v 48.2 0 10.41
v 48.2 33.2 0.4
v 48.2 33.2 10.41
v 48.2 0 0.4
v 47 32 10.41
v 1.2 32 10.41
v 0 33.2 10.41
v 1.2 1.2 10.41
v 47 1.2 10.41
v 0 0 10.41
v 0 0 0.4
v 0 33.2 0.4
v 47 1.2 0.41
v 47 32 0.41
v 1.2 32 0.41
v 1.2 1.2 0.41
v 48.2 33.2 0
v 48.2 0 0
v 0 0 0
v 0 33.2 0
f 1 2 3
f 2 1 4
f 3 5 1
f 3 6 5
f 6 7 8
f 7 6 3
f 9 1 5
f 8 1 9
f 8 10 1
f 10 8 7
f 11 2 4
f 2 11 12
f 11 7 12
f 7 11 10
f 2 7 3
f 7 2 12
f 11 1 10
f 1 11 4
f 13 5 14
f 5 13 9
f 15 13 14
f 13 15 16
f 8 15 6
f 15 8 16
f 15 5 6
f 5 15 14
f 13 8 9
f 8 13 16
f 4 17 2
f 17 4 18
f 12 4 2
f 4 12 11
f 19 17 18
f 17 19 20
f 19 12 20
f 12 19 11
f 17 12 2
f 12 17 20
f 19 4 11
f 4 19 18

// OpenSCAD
// file: ../../Base/Rotation.scad
// Fischertechnik Box Foundation
// Geometry Helpers Rotation

include <PlacementOptions.scad>

// getRotatedSpace(space, rotation=NoRotation)
// Rotates the space dependent on the specified rotation

function getRotatedSpace(space, rotation=NoRotation) = [
    (rotation == Rotate90 || rotation == Rotate270) ? space.y : space.x,
    (rotation == Rotate90 || rotation == Rotate270) ? space.x : space.y
];

// Rotates the given space around the fixed left lower corner
// space = the space the children needs as width/depth list [width,depth]
// rotation = 0 Rotate0 degrees, 1 Rotate90 degrees, 2 Rotate180 degrees, 3 Rotate270 degrees (equivalent to -90)

module RotateFix(space, rotation=NoRotation) {
    dy = (rotation == Rotate0 || rotation == Rotate270) ? 0 :
        (rotation == Rotate90) ? space.x :
        space.y;
    dx = (rotation < Rotate180) ? 0 :
        (rotation == Rotate180) ? space.x :
        space.y;
    
    translate([dx, dy, 0])
        rotate([0, 0, rotations[rotation]])
            children();
}
// file: ../../Base/Alignment.scad
// Fischertechnik Box Foundation
// Geometry Helpers Alignment

include <PlacementOptions.scad>

// getAlignedX(elementWidth, spaceWidth, align=AlignRight, offset=0)
// Gets the aligned X offset of an element with the given
// width in the given space.
// elementWidth = The width of the element to positon
// spaceWidth = The space where the element should be aligned
// align = 0 AlignLeft, 1 AlignCenter, 2 AlignRight
// offset = an optional offset from the aligned position. When
// aligned left or centered, then positive values are in X direction.
// When aligned right then positive values are in negative X direction.

function getAlignedX(elementWidth, spaceWidth, align=AlignRight, offset=0) =
    (align == AlignLeft) ?
        offset :
        ((align == AlignCenter) ?
        (spaceWidth - elementWidth)/2 + offset :
        spaceWidth - offset - elementWidth);

// getAlignedY(elementDepth, spaceDepth, align=AlignTop, offset=0)
// Gets the aligned Y offset of an element with the given
// depth in the given space.
// elementDepth = The depth of the element to positon
// spaceDepth = The space where the element should be aligned
// align = 0 AlignBottom, 1 AlignCenter, 2 AlignTop
// offset = an optional offset from the aligned position. When
// aligned bottom or centered, then positive values are in Y direction.
// When aligned top then positive values are in negative Y direction.

function getAlignedY(elementDepth, spaceDepth, align=AlignTop, offset=0) =
    (align == AlignBottom) ?
        offset :
        ((align == AlignCenter) ?
        (spaceDepth - elementDepth)/2 + offset :
        spaceDepth - offset - elementDepth);
// file: ../../Base/PlacementOptions.scad
// Fischertechnik Box Foundation
// Placement Options

// Alignment
NoAlign = 0;
AlignLeft = 1;
AlignBottom = 2;
AlignCenter = 3;
AlignRight = 4;
AlignTop = 5;

// Element rotation degree steps
rotations = [0, -90, -180, -270];

// Rotation
NoRotation = 0;
Rotate0 = 0;
Rotate90 = 1;
Rotate180 = 2;
Rotate270 = 3;

// Docking (seen from above)
NoDock = -1;
DockLeft = 0;
DockTop = 1;
DockRight = 2;
DockCorner = 2;
DockBottom = 3;

// Web corners
LowerLeft = 0;
UpperLeft = 1;
UpperRight = 2;
LowerRight = 3;

// Web position relative to corner
LeftOfCorner = 0;
RightOfCorner = 1;
// file: ../../Base/Boxes.scad
// Fischertechnik Box Foundation
// Pre-designed Boxes

use <Constants.scad>

include <PlacementOptions.scad>

box190Width = 190;
box190Depth = 130;
box130Width = 130;
box130Depth = 95;

// Values are from an original ec3 box
topBottomDifference = 1.5;
outerHeight = 40;
innerHeight = 38.2;
baseThickness = outerHeight - innerHeight;
stackExcess = 5.7;
radius = 3.5;
wallThickness = 1.5;
tolerance = 0.2;
stackOffset = innerHeight - stackExcess;

boxUsageHeight = stackOffset;
boxWallThickness = wallThickness;
boxBaseThickness = baseThickness;
boxWebWidth = 3.0;

// getBoxWallThickness()
// Gets the wall thickness of a Fischertechnik Box
function getBoxWallThickness() = boxWallThickness;

// getBoxUsageHeight()
// Gets the usable height of a Fischertechnik box
function getBoxUsageHeight() = boxUsageHeight;

// getBoxInnerHeight()
// Gets the inner height of a Fischertechnik box, including the stack excess
function getBoxInnerHeight() = innerHeight;

// getBoxBaseThickness()
// Gets the thickness of the Fischertechnik box base.
function getBoxBaseThickness() = boxBaseThickness;

// getBoxWebWidth()
// Gets the width of a box web
function getBoxWebWidth() = boxWebWidth;

// getBox190Space()
// Gets the usable inner space of a Box 190 as an x/y-list
function getBox190Space() = [
    box190Width - 2*getBoxWallThickness() - topBottomDifference, 
    box190Depth - 2*getBoxWallThickness() - topBottomDifference ];

// BoxBase(width, depth)
// Creates an empty stackable Fischertechnik compatible box
// width = Outer width of the box (190, 130, ...)
// depth = Outer depth of the box (130, 95, ...)

module BoxBase(width, depth, height=outerHeight) {    
    thinPlate = 0.01;

    innerHeight = height - baseThickness;    
    
    module BodyPlate(width, depth) {
        translate([radius, radius])
        hull() {
            w = width-2*radius;
            d = depth-2*radius;
            cube([w, d, thinPlate]);
            cylinder(thinPlate, r=radius, $fn=getFragments());
            translate([w, 0])
                cylinder(thinPlate, r=radius, $fn=getFragments());
            translate([w, d])
                cylinder(thinPlate, r=radius, $fn=getFragments());
            translate([0, d])
                cylinder(thinPlate, r=radius, $fn=getFragments());
        }
    }
    
    module Body(tolerance=tolerance) {
        hull() {
            // Bottom with tolerance to fit into the original boxes when stacked
            translate([-wallThickness+tolerance, -wallThickness+tolerance, -baseThickness])
                BodyPlate(width-topBottomDifference-2*tolerance, depth-topBottomDifference-2*tolerance);
            
            // Top
            translate([-wallThickness-topBottomDifference/2, -wallThickness-topBottomDifference/2, innerHeight-thinPlate])
                BodyPlate(width, depth);
         }
    }

    module Cutoff() {
        hull() {
            coWidth = width - 2*wallThickness;
            coDepth = depth - 2*wallThickness;
            
            // Bottom
            BodyPlate(coWidth-topBottomDifference, coDepth-topBottomDifference);

            // Top
            translate([-topBottomDifference/2, -topBottomDifference/2, innerHeight+thinPlate]) 
                BodyPlate(coWidth, coDepth);
        }
    }
    
    difference() {        
        Body();
        Cutoff();
        stackOffset = innerHeight - stackExcess;
        translate([0, 0, stackOffset + baseThickness])
            Body(tolerance=0);
    }
}

// Creates the Fischertechnik empty box 130x190 mm and places it at position 0,0
// 190x130 are the outer sizes, the inner space is slightly smaller. Use getBox190Space() to get the inner sizes.
// The box is positioned that the usable inner space is at the 0,0,0 position. The

module Box190() {
    BoxBase(box190Width, box190Depth);
}

// Gets the usable inner space of a Box 130 as an x/y-list
function getBox130Space() = [
    box130Width - 2*getBoxWallThickness() - topBottomDifference, 
    box130Depth - 2*getBoxWallThickness() - topBottomDifference ];

// Creates the Fischertechnik empty box 95x130 mm and places it at position 0,0
// 190x130 are the outer sizes, the inner space is slightly smaller. Use getBox190Space() to get the inner sizes.
// The box is positioned that the usable inner space is at the 0,0,0 position. The

module Box130() {
    BoxBase(box130Width, box130Depth);
}

// Creates a web at the specified box walls
// corner 0 = LowerLeft, 1 = UpperLeft, 2 = UpperRight, 3 = LowerRight
// side 0 = LeftOfCorner, 1 = RightOfCorner
// distance = Distance in mm from the corner
// boxSpace = inner width and depth of the box (default: Box 190)
// webWidth = length of the web (default is 3 mms)
// webThickness = thickness of the web (default is 1 mm)

module BoxWeb(corner, side, distance, boxSpace=getBox190Space(), webWidth=getBoxWebWidth(), webThickness=1.0) {
    sink = getBoxWallThickness()/2;

    width = (corner % 2 == 0) ? 
            (side == LeftOfCorner ? webWidth : webThickness) :
            (side == LeftOfCorner ? webThickness : webWidth);

    depth = (corner % 2 == 0) ? 
            (side == RightOfCorner ? webWidth : webThickness) :
            (side == RightOfCorner ? webThickness : webWidth);
    
    xDiff = corner == LowerLeft ? 
                (side == LeftOfCorner ? -sink : distance) :
            (corner == UpperLeft ?                
                (side == LeftOfCorner ? distance : -sink) :
            (corner == UpperRight ?
                (side == LeftOfCorner ? boxSpace.x-webWidth+sink : boxSpace.x-distance-webThickness) :
                (side == LeftOfCorner ? boxSpace.x-distance-webThickness: boxSpace.x-webWidth+sink)));

    yDiff = corner == LowerLeft ? 
                (side == RightOfCorner ? -sink : distance) :
            (corner == UpperLeft ?
                (side == RightOfCorner ? boxSpace.y-distance : boxSpace.y-webWidth+sink) :
            (corner == UpperRight ?
                (side == RightOfCorner ? boxSpace.y-webWidth+sink : boxSpace.y-distance) :
                (side == RightOfCorner ? distance : -sink)));
    
    translate([xDiff, yDiff, -getExcess()])
        cube([width, depth, boxUsageHeight + 2*getExcess()]);
}
// file: ../../Base/Placement.scad
// Fischertechnik Box Foundation
// Geometry Helpers Placement

use <Constants.scad>
use <Alignment.scad>
use <Rotation.scad>
use <Boxes.scad>

include <PlacementOptions.scad>

// Place(x=0, y=0, elementSpace=[0,0], alignX=AlignLeft, alignY=AlignBottom, rotation=Rotate0, boxSpace=getBox190Space())
// Places the child at the specified position
// y = Y-Position. This is a relative position when an X aligment is specified.
// x = X-Position. This is a relative position when an Y aligment is specified.
// elementSpace = space of the element to be placed [x,y]
// alignX = -1=NoAlign, 0 AlignLeft, 1 AlignCenter, 3 AlignRight (elementSpace and boxSpace required!)
// alignY = -1=NoAlign, 2 AlignBottom, 1 AlignCenter, 4 AlignTop (elementSpace and boxSpace required!)
// rotation = 0 Rotate0 0 degrees, 1 Rotate90 90 degrees, 
// 2 Rotate180 180 degrees, 3 Rotate270 270 degrees (equivalent to -90)
// boxSpace = Inner space of the box where the placement occurs [x,y] - default is Box 190x130 inner space

module Place(x=0, y=0, elementSpace=[0,0], 
  alignX=AlignLeft, alignY=AlignBottom, 
  rotation=NoRotation, boxSpace=getBox190Space()) {

    module Position(x, y, space, rotation=Rotate0) {
        translate([x, y, 0])
            RotateFix(space, rotation)
                children();
    }

    space = getRotatedSpace(elementSpace, rotation);
    alignedX = getAlignedX(space.x, boxSpace.x, alignX, x);
    alignedY = getAlignedY(space.y, boxSpace.y, alignY, y);
    Position(alignedX, alignedY, elementSpace, rotation)
        children();
}

// Center(space=getBox130Space(), elementSpace=[0,0])
// space = Space where the children is centered. For cylinder use centered=true and no elementSpace.
// elementSpace = space of the element to be centered [x,y]

module Center(space=getBox190Space(), elementSpace=[0,0]) {
    Place(elementSpace=elementSpace, boxSpace=space, alignX=AlignCenter, alignY=AlignCenter)
        children();
}

// CenterHorizontal(width=0, y=0, offset=0, space=getBox130Space())
// width = Width of the element to be placed.
// y = Y position of the element
// offset = Offset from the center position (negative will be left of the center)
// space = Space where the element is placed

module CenterHorizontal(width=0, y=0, offset=0, space=getBox190Space()) {
    Place(x=offset, y=y, elementSpace=[width, 0], boxSpace=space, alignX=AlignCenter)
        children(0);
}

// CenterVertical(depth=0, x=0, offset=0, space=getBox130Space())
// depth = Depth of the element to be placed.
// x = X position of the element
// offset = Offset from the center position (negative will be down of the center)
// space = Space where the element is placed

module CenterVertical(depth=0, x=0, offset=0, space=getBox190Space()) {
    Place(x=x, y=offset, elementSpace=[0, depth], boxSpace=space, alignY=AlignCenter)
        children(0);
}

// getIsVertical(align)
// True if the specified alignment needs a vertical orientation for a divider (AlignRight, AlignLeft)

function getIsVertical(align) = (align == AlignRight || align == AlignLeft);

// getIsHorizontal(align)
// True if the specified alignment needs a horizontal orientation for a divider (AlignTop, AlignBottom)

function getIsHorizontal(align) = (align == AlignTop || align == AlignBottom);
// file: ../../Elements/AxisClip10.scad
// Fischertechnik Box Library
// Axis for clip 10
// 31023

use <../ModelBase/Simple.scad>
use <../Base/Constants.scad>

width = 12;
depth = 12;
height = 23;
upperDiameter = 3.6;
clipHeight = 10;

// getAxisClip10Space()
// Gets the space of a frame for a clip 10 with spring ring (mot2)

function getAxisClip10Space() = [width, depth, height];

// AxisClip10(height, clipHeight)
// Axis for clip 10 with spring ring (mot2)
// height = Height of the complete axis
// clipHeight = Height of the rt for the clip (standard is 10, in mot3 its only 7)

module AxisClip10(height=height, clipHeight=clipHeight) {
    LeveledAxisWithSpace(height, height-clipHeight, getAxisClip10Space(), diameter=upperDiameter);
}

// Tests
color("lightgray")
AxisClip10();
// file: ../../Base/Constants.scad
// Fischertechnik Box Foundation
// Constants

// Constant values necessary for multiple elements

// Base constants
dividerThickness = 1.2;
excess = 0.01;
fragments = 90;
tolerance = 0.8;

// Gets the thickness of a divider 
function getDividerThickness() = dividerThickness;

// Gets the excess that is used to merge walls into each other
function getExcess() = excess;

// Gets amount of fragments of a cylinder
function getFragments() = fragments;

// Gets the inner tolerance of a frame to each side
function getTolerance() = tolerance;


// Fischertechnik specific constants
axisDiameter = 4;
axisBottomDiameter = axisDiameter + 1;
standardEdgeDistance = 2.5;
standardWebDistance = 11.5;
standardCornerLength = 15;
tubeWallFactor = 0.8;
smallPartsFrameHeight = 20;

// Gets axis diameter
function getAxisDiameter() = axisDiameter;

// Gets axis bottom diameter for thicker part at the bottom
function getAxisBottomDiameter() = axisBottomDiameter;

// gets the standard distance to the wall of the box for dockable frames with webs
function getStandardEdgeDistance() = standardEdgeDistance;

// gets the standard distance of each web to the corner of the dockable frame
function getStandardWebDistance() = standardWebDistance;

// gets the standard length of the corner walls of a dockable frame
function getStandardCornerLength() = standardCornerLength;

// gets the wall thickness of a tube.
function getTubeWallThickness() = tubeWallFactor * getDividerThickness();

// gets the frame height for docked small parts boxes.
function getSmallPartsFrameHeight() = smallPartsFrameHeight;
// file: ../../Elements/FrameDriversCabWithHole.scad
// Fischertechnik Box Library
// Driver's Cab with Hole
// 38443

use <../Base/Constants.scad>
use <../ModelBase/Simple.scad>

width = 45;
depth = 30;
height = 10;

// getFrameDriversCabWithHoleSpace()
// Gets the space the frame driver's cab with hole needs as width (.x and .y as a list)

function getFrameDriversCabWithHoleSpace() = getFrameOuterVolume([width, depth, height]);

// FrameDriversCabWithHole()
// Frame for Driver's Cab With Hole
// 38443

module FrameDriversCabWithHole() {
    Frame([width, depth, height]);
}

// Test
color("lightgray") {
FrameDriversCabWithHole();
}
// file: ../TestPrint.scad
// 3D Print Test Base

use <../Base/Constants.scad>

use <../Elements/AxisClip10.scad>

module TestPrint(elementSpace) {
    cube([elementSpace.x, elementSpace.y, 0.4]);
    translate([0,0,0.4+getExcess()]) {
        children();
    }
}

TestPrint(getAxisClip10Space())
    AxisClip10();
// main file
// 3D Print Test
// FrameDriversCabWithHole

use <../TestPrint.scad>
use <../../Elements/FrameDriversCabWithHole.scad>

TestPrint(getFrameDriversCabWithHoleSpace())
    FrameDriversCabWithHole();
